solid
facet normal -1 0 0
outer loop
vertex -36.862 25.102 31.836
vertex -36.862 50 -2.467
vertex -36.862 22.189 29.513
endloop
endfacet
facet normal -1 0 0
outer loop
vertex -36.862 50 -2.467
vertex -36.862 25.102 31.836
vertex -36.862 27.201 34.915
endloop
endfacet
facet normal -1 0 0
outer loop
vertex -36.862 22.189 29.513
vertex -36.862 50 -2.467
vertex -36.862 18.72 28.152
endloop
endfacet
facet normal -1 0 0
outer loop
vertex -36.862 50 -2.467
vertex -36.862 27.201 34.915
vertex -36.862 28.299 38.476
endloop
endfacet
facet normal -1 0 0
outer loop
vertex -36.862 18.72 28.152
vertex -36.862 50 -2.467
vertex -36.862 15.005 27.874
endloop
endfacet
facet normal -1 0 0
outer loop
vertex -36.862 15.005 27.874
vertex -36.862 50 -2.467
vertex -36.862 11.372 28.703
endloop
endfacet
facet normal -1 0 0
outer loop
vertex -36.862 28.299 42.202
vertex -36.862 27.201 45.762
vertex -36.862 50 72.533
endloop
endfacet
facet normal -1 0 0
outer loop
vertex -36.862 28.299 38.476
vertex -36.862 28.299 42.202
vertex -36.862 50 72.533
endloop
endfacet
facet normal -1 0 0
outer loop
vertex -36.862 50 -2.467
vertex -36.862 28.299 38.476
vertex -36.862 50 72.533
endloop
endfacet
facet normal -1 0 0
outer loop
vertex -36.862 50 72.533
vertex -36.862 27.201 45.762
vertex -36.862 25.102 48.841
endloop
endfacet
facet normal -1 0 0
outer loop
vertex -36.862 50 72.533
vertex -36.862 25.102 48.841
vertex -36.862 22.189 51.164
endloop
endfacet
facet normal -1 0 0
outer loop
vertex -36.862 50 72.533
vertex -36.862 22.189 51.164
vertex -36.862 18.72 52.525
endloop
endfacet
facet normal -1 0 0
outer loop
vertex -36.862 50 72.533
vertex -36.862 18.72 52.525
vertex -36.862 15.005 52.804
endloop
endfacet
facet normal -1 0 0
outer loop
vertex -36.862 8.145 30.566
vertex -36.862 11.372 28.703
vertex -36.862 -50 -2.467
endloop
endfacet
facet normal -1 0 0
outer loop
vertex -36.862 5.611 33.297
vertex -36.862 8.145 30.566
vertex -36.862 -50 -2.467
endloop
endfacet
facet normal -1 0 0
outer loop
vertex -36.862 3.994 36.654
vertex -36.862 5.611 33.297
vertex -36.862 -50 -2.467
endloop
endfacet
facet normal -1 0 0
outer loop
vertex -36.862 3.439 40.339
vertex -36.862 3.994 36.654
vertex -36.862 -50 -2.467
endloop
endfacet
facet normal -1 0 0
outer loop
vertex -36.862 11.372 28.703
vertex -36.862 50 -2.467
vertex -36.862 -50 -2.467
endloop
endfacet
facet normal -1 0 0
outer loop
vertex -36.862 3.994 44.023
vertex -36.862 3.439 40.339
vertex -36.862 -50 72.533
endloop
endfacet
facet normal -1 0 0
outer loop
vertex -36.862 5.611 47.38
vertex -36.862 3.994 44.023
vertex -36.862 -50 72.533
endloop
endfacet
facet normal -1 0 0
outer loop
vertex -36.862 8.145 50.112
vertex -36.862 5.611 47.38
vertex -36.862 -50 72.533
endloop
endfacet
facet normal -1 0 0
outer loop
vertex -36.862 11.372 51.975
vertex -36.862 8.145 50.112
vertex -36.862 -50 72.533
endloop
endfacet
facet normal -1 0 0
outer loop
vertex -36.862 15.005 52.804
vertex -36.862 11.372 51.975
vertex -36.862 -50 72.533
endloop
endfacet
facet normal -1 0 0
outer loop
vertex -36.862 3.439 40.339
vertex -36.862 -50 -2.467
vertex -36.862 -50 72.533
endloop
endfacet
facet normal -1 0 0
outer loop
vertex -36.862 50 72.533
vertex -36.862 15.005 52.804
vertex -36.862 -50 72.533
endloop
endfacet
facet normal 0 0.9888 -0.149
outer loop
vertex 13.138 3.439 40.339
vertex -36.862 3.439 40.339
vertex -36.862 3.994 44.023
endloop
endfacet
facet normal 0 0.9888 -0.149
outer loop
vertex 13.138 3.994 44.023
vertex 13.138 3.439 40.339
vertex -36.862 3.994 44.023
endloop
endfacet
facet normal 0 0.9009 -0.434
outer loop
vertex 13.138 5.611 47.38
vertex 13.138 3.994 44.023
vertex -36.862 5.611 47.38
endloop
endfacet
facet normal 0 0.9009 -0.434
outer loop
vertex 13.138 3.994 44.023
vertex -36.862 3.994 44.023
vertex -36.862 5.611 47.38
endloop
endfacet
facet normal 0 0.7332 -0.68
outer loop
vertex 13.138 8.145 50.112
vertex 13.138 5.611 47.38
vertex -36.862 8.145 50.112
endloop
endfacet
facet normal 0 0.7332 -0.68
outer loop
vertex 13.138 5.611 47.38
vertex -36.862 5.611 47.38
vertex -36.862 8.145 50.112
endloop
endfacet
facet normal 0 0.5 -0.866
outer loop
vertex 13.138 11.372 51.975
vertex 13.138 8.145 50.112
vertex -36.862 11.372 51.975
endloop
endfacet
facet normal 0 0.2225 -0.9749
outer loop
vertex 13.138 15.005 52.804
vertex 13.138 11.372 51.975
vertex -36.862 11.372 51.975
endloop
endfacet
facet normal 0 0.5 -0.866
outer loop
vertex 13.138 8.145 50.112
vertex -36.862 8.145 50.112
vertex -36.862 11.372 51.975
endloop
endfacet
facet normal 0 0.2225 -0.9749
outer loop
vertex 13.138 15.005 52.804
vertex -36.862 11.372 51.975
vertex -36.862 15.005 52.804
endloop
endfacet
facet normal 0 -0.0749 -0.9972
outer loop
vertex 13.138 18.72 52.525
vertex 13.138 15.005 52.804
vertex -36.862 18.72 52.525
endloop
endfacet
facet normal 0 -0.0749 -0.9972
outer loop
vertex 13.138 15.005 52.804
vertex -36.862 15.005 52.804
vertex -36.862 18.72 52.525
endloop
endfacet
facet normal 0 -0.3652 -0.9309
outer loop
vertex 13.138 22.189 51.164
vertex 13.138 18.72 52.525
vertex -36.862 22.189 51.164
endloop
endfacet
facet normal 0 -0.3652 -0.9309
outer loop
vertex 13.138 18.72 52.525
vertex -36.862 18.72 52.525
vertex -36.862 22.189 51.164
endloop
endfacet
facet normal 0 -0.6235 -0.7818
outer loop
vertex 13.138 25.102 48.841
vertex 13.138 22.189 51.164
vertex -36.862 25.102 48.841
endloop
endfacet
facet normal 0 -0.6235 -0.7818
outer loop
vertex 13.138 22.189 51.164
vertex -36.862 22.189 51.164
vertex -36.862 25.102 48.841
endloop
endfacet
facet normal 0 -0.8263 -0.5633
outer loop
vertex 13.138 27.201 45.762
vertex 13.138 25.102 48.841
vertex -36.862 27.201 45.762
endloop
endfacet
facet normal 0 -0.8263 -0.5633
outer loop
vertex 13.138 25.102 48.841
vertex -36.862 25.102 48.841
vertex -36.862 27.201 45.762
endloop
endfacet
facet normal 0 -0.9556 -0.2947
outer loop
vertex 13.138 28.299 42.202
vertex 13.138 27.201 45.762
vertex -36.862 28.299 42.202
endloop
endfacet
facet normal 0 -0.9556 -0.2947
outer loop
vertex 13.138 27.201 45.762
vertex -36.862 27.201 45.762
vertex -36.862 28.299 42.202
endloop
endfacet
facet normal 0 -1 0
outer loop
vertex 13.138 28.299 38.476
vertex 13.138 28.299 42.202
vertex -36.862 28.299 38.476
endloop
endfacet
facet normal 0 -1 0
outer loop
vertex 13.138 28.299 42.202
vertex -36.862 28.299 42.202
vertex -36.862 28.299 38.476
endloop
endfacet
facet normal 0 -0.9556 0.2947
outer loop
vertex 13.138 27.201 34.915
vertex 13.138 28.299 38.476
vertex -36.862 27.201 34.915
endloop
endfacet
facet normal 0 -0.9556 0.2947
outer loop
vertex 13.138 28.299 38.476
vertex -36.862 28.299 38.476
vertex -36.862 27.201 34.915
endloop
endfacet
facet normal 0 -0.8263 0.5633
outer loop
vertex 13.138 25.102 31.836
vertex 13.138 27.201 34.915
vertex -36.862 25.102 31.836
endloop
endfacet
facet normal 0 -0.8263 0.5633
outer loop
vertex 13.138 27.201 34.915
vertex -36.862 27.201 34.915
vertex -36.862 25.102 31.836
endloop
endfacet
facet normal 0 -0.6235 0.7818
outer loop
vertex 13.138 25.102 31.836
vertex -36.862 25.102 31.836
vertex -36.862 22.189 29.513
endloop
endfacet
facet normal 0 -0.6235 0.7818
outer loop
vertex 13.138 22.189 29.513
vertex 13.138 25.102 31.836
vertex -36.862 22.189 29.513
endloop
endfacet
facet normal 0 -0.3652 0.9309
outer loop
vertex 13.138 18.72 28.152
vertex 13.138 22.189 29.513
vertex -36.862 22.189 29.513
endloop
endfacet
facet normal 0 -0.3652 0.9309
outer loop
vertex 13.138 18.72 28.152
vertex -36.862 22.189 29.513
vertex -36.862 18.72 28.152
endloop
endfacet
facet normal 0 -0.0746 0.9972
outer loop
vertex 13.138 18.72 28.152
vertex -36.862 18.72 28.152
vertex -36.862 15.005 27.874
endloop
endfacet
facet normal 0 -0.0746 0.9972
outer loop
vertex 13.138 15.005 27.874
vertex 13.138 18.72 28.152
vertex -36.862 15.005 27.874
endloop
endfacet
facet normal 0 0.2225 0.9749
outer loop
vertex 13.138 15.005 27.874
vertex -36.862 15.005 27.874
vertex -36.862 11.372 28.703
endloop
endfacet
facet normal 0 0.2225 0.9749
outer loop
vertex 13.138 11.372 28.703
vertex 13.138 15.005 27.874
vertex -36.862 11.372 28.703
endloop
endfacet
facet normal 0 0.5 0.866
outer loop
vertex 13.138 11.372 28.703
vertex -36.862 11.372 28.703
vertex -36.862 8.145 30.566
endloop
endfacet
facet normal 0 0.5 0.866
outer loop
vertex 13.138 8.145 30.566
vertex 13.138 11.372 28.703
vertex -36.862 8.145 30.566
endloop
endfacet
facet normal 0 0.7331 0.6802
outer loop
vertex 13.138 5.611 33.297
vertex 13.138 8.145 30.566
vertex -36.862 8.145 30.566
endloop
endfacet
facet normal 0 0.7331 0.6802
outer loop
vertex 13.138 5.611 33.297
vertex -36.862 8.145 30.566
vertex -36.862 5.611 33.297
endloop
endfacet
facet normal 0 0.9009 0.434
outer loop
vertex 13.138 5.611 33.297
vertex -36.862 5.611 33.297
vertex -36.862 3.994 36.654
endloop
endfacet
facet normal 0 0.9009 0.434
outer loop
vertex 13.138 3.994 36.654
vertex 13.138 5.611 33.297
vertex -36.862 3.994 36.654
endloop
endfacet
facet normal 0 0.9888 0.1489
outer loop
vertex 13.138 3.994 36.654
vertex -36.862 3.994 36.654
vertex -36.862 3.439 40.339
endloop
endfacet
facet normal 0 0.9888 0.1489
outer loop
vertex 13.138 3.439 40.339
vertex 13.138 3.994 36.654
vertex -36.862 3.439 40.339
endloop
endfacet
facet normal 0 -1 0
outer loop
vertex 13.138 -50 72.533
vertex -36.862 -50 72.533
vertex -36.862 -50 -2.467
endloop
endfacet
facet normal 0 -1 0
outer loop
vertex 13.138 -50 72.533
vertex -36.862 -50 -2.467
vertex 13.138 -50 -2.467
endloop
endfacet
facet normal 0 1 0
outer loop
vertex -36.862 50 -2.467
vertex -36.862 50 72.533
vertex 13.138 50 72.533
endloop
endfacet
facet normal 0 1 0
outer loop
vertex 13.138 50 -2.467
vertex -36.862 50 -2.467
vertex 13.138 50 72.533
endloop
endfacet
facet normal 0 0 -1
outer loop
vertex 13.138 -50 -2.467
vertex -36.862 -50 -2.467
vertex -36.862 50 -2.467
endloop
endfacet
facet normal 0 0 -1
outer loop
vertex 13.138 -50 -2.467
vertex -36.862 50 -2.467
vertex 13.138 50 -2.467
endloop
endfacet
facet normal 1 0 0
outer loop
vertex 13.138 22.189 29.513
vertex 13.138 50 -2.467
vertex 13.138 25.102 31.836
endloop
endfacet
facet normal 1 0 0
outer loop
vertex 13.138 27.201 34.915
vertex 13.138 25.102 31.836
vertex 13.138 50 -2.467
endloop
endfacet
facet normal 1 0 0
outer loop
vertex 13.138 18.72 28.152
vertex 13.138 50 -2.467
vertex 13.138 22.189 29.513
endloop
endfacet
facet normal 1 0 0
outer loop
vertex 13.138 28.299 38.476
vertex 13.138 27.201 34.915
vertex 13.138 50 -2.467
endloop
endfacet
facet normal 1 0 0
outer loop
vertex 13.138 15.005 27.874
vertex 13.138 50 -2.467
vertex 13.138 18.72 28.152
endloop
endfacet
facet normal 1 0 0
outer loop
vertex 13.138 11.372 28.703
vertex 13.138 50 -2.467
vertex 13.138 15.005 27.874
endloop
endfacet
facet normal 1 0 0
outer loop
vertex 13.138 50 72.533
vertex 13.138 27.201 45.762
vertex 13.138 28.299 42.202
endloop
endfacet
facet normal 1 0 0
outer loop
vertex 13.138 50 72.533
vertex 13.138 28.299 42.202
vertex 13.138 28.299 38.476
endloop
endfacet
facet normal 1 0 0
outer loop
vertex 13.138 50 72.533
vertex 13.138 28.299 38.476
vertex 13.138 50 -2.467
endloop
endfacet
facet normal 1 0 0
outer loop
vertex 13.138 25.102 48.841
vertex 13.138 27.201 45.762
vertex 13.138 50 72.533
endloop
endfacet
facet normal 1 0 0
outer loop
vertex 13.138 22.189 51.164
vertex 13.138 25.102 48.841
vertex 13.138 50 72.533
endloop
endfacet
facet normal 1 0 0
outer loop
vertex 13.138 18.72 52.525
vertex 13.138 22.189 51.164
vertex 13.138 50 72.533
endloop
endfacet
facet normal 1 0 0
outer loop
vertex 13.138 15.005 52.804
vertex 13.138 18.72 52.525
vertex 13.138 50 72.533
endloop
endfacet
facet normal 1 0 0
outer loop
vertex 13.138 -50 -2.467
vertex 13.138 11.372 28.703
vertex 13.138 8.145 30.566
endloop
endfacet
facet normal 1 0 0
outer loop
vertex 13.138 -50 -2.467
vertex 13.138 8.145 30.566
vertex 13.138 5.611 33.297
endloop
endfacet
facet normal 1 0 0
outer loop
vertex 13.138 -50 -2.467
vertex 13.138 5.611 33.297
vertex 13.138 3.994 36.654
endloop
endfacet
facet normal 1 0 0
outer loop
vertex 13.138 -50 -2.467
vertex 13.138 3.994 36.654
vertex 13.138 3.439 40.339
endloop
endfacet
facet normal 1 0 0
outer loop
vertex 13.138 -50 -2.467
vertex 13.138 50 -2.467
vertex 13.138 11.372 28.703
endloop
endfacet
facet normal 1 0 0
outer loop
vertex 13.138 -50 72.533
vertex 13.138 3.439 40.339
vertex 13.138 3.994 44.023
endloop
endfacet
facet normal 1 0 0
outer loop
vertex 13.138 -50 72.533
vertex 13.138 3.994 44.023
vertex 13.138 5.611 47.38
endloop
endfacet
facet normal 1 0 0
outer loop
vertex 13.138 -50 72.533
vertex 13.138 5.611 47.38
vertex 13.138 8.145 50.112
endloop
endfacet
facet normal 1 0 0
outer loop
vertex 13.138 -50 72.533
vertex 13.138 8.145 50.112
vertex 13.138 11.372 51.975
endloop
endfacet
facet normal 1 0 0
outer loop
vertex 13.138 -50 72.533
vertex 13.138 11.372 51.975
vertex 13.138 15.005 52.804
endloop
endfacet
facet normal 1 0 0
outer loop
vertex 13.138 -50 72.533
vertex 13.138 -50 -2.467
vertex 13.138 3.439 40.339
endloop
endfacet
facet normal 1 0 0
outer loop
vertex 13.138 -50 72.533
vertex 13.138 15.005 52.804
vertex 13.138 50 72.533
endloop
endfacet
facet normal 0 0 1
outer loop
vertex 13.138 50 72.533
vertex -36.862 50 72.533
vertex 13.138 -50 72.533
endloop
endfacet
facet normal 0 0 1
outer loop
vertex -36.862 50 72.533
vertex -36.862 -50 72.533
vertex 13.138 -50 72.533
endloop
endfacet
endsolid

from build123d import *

# Parameters (mm, degrees)
F0_W     = 50
F0_H     = 75
F1_DEPTH = 50
F3_D     = 25


with BuildPart() as f1:
    # F0 (on Front) → F1 (new body, symmetric)
    with BuildSketch(Plane.XZ):
        with Locations((-11.862348, 35.03312)):
            Rectangle(F0_W, F0_H)
    extrude(amount=F1_DEPTH, both=True)

    # F3 (through all)
    with Locations(Plane.YZ.offset(13.137652)):
        with Locations((15.938677, 40.338628)):
            Hole(F3_D / 2)


solid = f1.part
